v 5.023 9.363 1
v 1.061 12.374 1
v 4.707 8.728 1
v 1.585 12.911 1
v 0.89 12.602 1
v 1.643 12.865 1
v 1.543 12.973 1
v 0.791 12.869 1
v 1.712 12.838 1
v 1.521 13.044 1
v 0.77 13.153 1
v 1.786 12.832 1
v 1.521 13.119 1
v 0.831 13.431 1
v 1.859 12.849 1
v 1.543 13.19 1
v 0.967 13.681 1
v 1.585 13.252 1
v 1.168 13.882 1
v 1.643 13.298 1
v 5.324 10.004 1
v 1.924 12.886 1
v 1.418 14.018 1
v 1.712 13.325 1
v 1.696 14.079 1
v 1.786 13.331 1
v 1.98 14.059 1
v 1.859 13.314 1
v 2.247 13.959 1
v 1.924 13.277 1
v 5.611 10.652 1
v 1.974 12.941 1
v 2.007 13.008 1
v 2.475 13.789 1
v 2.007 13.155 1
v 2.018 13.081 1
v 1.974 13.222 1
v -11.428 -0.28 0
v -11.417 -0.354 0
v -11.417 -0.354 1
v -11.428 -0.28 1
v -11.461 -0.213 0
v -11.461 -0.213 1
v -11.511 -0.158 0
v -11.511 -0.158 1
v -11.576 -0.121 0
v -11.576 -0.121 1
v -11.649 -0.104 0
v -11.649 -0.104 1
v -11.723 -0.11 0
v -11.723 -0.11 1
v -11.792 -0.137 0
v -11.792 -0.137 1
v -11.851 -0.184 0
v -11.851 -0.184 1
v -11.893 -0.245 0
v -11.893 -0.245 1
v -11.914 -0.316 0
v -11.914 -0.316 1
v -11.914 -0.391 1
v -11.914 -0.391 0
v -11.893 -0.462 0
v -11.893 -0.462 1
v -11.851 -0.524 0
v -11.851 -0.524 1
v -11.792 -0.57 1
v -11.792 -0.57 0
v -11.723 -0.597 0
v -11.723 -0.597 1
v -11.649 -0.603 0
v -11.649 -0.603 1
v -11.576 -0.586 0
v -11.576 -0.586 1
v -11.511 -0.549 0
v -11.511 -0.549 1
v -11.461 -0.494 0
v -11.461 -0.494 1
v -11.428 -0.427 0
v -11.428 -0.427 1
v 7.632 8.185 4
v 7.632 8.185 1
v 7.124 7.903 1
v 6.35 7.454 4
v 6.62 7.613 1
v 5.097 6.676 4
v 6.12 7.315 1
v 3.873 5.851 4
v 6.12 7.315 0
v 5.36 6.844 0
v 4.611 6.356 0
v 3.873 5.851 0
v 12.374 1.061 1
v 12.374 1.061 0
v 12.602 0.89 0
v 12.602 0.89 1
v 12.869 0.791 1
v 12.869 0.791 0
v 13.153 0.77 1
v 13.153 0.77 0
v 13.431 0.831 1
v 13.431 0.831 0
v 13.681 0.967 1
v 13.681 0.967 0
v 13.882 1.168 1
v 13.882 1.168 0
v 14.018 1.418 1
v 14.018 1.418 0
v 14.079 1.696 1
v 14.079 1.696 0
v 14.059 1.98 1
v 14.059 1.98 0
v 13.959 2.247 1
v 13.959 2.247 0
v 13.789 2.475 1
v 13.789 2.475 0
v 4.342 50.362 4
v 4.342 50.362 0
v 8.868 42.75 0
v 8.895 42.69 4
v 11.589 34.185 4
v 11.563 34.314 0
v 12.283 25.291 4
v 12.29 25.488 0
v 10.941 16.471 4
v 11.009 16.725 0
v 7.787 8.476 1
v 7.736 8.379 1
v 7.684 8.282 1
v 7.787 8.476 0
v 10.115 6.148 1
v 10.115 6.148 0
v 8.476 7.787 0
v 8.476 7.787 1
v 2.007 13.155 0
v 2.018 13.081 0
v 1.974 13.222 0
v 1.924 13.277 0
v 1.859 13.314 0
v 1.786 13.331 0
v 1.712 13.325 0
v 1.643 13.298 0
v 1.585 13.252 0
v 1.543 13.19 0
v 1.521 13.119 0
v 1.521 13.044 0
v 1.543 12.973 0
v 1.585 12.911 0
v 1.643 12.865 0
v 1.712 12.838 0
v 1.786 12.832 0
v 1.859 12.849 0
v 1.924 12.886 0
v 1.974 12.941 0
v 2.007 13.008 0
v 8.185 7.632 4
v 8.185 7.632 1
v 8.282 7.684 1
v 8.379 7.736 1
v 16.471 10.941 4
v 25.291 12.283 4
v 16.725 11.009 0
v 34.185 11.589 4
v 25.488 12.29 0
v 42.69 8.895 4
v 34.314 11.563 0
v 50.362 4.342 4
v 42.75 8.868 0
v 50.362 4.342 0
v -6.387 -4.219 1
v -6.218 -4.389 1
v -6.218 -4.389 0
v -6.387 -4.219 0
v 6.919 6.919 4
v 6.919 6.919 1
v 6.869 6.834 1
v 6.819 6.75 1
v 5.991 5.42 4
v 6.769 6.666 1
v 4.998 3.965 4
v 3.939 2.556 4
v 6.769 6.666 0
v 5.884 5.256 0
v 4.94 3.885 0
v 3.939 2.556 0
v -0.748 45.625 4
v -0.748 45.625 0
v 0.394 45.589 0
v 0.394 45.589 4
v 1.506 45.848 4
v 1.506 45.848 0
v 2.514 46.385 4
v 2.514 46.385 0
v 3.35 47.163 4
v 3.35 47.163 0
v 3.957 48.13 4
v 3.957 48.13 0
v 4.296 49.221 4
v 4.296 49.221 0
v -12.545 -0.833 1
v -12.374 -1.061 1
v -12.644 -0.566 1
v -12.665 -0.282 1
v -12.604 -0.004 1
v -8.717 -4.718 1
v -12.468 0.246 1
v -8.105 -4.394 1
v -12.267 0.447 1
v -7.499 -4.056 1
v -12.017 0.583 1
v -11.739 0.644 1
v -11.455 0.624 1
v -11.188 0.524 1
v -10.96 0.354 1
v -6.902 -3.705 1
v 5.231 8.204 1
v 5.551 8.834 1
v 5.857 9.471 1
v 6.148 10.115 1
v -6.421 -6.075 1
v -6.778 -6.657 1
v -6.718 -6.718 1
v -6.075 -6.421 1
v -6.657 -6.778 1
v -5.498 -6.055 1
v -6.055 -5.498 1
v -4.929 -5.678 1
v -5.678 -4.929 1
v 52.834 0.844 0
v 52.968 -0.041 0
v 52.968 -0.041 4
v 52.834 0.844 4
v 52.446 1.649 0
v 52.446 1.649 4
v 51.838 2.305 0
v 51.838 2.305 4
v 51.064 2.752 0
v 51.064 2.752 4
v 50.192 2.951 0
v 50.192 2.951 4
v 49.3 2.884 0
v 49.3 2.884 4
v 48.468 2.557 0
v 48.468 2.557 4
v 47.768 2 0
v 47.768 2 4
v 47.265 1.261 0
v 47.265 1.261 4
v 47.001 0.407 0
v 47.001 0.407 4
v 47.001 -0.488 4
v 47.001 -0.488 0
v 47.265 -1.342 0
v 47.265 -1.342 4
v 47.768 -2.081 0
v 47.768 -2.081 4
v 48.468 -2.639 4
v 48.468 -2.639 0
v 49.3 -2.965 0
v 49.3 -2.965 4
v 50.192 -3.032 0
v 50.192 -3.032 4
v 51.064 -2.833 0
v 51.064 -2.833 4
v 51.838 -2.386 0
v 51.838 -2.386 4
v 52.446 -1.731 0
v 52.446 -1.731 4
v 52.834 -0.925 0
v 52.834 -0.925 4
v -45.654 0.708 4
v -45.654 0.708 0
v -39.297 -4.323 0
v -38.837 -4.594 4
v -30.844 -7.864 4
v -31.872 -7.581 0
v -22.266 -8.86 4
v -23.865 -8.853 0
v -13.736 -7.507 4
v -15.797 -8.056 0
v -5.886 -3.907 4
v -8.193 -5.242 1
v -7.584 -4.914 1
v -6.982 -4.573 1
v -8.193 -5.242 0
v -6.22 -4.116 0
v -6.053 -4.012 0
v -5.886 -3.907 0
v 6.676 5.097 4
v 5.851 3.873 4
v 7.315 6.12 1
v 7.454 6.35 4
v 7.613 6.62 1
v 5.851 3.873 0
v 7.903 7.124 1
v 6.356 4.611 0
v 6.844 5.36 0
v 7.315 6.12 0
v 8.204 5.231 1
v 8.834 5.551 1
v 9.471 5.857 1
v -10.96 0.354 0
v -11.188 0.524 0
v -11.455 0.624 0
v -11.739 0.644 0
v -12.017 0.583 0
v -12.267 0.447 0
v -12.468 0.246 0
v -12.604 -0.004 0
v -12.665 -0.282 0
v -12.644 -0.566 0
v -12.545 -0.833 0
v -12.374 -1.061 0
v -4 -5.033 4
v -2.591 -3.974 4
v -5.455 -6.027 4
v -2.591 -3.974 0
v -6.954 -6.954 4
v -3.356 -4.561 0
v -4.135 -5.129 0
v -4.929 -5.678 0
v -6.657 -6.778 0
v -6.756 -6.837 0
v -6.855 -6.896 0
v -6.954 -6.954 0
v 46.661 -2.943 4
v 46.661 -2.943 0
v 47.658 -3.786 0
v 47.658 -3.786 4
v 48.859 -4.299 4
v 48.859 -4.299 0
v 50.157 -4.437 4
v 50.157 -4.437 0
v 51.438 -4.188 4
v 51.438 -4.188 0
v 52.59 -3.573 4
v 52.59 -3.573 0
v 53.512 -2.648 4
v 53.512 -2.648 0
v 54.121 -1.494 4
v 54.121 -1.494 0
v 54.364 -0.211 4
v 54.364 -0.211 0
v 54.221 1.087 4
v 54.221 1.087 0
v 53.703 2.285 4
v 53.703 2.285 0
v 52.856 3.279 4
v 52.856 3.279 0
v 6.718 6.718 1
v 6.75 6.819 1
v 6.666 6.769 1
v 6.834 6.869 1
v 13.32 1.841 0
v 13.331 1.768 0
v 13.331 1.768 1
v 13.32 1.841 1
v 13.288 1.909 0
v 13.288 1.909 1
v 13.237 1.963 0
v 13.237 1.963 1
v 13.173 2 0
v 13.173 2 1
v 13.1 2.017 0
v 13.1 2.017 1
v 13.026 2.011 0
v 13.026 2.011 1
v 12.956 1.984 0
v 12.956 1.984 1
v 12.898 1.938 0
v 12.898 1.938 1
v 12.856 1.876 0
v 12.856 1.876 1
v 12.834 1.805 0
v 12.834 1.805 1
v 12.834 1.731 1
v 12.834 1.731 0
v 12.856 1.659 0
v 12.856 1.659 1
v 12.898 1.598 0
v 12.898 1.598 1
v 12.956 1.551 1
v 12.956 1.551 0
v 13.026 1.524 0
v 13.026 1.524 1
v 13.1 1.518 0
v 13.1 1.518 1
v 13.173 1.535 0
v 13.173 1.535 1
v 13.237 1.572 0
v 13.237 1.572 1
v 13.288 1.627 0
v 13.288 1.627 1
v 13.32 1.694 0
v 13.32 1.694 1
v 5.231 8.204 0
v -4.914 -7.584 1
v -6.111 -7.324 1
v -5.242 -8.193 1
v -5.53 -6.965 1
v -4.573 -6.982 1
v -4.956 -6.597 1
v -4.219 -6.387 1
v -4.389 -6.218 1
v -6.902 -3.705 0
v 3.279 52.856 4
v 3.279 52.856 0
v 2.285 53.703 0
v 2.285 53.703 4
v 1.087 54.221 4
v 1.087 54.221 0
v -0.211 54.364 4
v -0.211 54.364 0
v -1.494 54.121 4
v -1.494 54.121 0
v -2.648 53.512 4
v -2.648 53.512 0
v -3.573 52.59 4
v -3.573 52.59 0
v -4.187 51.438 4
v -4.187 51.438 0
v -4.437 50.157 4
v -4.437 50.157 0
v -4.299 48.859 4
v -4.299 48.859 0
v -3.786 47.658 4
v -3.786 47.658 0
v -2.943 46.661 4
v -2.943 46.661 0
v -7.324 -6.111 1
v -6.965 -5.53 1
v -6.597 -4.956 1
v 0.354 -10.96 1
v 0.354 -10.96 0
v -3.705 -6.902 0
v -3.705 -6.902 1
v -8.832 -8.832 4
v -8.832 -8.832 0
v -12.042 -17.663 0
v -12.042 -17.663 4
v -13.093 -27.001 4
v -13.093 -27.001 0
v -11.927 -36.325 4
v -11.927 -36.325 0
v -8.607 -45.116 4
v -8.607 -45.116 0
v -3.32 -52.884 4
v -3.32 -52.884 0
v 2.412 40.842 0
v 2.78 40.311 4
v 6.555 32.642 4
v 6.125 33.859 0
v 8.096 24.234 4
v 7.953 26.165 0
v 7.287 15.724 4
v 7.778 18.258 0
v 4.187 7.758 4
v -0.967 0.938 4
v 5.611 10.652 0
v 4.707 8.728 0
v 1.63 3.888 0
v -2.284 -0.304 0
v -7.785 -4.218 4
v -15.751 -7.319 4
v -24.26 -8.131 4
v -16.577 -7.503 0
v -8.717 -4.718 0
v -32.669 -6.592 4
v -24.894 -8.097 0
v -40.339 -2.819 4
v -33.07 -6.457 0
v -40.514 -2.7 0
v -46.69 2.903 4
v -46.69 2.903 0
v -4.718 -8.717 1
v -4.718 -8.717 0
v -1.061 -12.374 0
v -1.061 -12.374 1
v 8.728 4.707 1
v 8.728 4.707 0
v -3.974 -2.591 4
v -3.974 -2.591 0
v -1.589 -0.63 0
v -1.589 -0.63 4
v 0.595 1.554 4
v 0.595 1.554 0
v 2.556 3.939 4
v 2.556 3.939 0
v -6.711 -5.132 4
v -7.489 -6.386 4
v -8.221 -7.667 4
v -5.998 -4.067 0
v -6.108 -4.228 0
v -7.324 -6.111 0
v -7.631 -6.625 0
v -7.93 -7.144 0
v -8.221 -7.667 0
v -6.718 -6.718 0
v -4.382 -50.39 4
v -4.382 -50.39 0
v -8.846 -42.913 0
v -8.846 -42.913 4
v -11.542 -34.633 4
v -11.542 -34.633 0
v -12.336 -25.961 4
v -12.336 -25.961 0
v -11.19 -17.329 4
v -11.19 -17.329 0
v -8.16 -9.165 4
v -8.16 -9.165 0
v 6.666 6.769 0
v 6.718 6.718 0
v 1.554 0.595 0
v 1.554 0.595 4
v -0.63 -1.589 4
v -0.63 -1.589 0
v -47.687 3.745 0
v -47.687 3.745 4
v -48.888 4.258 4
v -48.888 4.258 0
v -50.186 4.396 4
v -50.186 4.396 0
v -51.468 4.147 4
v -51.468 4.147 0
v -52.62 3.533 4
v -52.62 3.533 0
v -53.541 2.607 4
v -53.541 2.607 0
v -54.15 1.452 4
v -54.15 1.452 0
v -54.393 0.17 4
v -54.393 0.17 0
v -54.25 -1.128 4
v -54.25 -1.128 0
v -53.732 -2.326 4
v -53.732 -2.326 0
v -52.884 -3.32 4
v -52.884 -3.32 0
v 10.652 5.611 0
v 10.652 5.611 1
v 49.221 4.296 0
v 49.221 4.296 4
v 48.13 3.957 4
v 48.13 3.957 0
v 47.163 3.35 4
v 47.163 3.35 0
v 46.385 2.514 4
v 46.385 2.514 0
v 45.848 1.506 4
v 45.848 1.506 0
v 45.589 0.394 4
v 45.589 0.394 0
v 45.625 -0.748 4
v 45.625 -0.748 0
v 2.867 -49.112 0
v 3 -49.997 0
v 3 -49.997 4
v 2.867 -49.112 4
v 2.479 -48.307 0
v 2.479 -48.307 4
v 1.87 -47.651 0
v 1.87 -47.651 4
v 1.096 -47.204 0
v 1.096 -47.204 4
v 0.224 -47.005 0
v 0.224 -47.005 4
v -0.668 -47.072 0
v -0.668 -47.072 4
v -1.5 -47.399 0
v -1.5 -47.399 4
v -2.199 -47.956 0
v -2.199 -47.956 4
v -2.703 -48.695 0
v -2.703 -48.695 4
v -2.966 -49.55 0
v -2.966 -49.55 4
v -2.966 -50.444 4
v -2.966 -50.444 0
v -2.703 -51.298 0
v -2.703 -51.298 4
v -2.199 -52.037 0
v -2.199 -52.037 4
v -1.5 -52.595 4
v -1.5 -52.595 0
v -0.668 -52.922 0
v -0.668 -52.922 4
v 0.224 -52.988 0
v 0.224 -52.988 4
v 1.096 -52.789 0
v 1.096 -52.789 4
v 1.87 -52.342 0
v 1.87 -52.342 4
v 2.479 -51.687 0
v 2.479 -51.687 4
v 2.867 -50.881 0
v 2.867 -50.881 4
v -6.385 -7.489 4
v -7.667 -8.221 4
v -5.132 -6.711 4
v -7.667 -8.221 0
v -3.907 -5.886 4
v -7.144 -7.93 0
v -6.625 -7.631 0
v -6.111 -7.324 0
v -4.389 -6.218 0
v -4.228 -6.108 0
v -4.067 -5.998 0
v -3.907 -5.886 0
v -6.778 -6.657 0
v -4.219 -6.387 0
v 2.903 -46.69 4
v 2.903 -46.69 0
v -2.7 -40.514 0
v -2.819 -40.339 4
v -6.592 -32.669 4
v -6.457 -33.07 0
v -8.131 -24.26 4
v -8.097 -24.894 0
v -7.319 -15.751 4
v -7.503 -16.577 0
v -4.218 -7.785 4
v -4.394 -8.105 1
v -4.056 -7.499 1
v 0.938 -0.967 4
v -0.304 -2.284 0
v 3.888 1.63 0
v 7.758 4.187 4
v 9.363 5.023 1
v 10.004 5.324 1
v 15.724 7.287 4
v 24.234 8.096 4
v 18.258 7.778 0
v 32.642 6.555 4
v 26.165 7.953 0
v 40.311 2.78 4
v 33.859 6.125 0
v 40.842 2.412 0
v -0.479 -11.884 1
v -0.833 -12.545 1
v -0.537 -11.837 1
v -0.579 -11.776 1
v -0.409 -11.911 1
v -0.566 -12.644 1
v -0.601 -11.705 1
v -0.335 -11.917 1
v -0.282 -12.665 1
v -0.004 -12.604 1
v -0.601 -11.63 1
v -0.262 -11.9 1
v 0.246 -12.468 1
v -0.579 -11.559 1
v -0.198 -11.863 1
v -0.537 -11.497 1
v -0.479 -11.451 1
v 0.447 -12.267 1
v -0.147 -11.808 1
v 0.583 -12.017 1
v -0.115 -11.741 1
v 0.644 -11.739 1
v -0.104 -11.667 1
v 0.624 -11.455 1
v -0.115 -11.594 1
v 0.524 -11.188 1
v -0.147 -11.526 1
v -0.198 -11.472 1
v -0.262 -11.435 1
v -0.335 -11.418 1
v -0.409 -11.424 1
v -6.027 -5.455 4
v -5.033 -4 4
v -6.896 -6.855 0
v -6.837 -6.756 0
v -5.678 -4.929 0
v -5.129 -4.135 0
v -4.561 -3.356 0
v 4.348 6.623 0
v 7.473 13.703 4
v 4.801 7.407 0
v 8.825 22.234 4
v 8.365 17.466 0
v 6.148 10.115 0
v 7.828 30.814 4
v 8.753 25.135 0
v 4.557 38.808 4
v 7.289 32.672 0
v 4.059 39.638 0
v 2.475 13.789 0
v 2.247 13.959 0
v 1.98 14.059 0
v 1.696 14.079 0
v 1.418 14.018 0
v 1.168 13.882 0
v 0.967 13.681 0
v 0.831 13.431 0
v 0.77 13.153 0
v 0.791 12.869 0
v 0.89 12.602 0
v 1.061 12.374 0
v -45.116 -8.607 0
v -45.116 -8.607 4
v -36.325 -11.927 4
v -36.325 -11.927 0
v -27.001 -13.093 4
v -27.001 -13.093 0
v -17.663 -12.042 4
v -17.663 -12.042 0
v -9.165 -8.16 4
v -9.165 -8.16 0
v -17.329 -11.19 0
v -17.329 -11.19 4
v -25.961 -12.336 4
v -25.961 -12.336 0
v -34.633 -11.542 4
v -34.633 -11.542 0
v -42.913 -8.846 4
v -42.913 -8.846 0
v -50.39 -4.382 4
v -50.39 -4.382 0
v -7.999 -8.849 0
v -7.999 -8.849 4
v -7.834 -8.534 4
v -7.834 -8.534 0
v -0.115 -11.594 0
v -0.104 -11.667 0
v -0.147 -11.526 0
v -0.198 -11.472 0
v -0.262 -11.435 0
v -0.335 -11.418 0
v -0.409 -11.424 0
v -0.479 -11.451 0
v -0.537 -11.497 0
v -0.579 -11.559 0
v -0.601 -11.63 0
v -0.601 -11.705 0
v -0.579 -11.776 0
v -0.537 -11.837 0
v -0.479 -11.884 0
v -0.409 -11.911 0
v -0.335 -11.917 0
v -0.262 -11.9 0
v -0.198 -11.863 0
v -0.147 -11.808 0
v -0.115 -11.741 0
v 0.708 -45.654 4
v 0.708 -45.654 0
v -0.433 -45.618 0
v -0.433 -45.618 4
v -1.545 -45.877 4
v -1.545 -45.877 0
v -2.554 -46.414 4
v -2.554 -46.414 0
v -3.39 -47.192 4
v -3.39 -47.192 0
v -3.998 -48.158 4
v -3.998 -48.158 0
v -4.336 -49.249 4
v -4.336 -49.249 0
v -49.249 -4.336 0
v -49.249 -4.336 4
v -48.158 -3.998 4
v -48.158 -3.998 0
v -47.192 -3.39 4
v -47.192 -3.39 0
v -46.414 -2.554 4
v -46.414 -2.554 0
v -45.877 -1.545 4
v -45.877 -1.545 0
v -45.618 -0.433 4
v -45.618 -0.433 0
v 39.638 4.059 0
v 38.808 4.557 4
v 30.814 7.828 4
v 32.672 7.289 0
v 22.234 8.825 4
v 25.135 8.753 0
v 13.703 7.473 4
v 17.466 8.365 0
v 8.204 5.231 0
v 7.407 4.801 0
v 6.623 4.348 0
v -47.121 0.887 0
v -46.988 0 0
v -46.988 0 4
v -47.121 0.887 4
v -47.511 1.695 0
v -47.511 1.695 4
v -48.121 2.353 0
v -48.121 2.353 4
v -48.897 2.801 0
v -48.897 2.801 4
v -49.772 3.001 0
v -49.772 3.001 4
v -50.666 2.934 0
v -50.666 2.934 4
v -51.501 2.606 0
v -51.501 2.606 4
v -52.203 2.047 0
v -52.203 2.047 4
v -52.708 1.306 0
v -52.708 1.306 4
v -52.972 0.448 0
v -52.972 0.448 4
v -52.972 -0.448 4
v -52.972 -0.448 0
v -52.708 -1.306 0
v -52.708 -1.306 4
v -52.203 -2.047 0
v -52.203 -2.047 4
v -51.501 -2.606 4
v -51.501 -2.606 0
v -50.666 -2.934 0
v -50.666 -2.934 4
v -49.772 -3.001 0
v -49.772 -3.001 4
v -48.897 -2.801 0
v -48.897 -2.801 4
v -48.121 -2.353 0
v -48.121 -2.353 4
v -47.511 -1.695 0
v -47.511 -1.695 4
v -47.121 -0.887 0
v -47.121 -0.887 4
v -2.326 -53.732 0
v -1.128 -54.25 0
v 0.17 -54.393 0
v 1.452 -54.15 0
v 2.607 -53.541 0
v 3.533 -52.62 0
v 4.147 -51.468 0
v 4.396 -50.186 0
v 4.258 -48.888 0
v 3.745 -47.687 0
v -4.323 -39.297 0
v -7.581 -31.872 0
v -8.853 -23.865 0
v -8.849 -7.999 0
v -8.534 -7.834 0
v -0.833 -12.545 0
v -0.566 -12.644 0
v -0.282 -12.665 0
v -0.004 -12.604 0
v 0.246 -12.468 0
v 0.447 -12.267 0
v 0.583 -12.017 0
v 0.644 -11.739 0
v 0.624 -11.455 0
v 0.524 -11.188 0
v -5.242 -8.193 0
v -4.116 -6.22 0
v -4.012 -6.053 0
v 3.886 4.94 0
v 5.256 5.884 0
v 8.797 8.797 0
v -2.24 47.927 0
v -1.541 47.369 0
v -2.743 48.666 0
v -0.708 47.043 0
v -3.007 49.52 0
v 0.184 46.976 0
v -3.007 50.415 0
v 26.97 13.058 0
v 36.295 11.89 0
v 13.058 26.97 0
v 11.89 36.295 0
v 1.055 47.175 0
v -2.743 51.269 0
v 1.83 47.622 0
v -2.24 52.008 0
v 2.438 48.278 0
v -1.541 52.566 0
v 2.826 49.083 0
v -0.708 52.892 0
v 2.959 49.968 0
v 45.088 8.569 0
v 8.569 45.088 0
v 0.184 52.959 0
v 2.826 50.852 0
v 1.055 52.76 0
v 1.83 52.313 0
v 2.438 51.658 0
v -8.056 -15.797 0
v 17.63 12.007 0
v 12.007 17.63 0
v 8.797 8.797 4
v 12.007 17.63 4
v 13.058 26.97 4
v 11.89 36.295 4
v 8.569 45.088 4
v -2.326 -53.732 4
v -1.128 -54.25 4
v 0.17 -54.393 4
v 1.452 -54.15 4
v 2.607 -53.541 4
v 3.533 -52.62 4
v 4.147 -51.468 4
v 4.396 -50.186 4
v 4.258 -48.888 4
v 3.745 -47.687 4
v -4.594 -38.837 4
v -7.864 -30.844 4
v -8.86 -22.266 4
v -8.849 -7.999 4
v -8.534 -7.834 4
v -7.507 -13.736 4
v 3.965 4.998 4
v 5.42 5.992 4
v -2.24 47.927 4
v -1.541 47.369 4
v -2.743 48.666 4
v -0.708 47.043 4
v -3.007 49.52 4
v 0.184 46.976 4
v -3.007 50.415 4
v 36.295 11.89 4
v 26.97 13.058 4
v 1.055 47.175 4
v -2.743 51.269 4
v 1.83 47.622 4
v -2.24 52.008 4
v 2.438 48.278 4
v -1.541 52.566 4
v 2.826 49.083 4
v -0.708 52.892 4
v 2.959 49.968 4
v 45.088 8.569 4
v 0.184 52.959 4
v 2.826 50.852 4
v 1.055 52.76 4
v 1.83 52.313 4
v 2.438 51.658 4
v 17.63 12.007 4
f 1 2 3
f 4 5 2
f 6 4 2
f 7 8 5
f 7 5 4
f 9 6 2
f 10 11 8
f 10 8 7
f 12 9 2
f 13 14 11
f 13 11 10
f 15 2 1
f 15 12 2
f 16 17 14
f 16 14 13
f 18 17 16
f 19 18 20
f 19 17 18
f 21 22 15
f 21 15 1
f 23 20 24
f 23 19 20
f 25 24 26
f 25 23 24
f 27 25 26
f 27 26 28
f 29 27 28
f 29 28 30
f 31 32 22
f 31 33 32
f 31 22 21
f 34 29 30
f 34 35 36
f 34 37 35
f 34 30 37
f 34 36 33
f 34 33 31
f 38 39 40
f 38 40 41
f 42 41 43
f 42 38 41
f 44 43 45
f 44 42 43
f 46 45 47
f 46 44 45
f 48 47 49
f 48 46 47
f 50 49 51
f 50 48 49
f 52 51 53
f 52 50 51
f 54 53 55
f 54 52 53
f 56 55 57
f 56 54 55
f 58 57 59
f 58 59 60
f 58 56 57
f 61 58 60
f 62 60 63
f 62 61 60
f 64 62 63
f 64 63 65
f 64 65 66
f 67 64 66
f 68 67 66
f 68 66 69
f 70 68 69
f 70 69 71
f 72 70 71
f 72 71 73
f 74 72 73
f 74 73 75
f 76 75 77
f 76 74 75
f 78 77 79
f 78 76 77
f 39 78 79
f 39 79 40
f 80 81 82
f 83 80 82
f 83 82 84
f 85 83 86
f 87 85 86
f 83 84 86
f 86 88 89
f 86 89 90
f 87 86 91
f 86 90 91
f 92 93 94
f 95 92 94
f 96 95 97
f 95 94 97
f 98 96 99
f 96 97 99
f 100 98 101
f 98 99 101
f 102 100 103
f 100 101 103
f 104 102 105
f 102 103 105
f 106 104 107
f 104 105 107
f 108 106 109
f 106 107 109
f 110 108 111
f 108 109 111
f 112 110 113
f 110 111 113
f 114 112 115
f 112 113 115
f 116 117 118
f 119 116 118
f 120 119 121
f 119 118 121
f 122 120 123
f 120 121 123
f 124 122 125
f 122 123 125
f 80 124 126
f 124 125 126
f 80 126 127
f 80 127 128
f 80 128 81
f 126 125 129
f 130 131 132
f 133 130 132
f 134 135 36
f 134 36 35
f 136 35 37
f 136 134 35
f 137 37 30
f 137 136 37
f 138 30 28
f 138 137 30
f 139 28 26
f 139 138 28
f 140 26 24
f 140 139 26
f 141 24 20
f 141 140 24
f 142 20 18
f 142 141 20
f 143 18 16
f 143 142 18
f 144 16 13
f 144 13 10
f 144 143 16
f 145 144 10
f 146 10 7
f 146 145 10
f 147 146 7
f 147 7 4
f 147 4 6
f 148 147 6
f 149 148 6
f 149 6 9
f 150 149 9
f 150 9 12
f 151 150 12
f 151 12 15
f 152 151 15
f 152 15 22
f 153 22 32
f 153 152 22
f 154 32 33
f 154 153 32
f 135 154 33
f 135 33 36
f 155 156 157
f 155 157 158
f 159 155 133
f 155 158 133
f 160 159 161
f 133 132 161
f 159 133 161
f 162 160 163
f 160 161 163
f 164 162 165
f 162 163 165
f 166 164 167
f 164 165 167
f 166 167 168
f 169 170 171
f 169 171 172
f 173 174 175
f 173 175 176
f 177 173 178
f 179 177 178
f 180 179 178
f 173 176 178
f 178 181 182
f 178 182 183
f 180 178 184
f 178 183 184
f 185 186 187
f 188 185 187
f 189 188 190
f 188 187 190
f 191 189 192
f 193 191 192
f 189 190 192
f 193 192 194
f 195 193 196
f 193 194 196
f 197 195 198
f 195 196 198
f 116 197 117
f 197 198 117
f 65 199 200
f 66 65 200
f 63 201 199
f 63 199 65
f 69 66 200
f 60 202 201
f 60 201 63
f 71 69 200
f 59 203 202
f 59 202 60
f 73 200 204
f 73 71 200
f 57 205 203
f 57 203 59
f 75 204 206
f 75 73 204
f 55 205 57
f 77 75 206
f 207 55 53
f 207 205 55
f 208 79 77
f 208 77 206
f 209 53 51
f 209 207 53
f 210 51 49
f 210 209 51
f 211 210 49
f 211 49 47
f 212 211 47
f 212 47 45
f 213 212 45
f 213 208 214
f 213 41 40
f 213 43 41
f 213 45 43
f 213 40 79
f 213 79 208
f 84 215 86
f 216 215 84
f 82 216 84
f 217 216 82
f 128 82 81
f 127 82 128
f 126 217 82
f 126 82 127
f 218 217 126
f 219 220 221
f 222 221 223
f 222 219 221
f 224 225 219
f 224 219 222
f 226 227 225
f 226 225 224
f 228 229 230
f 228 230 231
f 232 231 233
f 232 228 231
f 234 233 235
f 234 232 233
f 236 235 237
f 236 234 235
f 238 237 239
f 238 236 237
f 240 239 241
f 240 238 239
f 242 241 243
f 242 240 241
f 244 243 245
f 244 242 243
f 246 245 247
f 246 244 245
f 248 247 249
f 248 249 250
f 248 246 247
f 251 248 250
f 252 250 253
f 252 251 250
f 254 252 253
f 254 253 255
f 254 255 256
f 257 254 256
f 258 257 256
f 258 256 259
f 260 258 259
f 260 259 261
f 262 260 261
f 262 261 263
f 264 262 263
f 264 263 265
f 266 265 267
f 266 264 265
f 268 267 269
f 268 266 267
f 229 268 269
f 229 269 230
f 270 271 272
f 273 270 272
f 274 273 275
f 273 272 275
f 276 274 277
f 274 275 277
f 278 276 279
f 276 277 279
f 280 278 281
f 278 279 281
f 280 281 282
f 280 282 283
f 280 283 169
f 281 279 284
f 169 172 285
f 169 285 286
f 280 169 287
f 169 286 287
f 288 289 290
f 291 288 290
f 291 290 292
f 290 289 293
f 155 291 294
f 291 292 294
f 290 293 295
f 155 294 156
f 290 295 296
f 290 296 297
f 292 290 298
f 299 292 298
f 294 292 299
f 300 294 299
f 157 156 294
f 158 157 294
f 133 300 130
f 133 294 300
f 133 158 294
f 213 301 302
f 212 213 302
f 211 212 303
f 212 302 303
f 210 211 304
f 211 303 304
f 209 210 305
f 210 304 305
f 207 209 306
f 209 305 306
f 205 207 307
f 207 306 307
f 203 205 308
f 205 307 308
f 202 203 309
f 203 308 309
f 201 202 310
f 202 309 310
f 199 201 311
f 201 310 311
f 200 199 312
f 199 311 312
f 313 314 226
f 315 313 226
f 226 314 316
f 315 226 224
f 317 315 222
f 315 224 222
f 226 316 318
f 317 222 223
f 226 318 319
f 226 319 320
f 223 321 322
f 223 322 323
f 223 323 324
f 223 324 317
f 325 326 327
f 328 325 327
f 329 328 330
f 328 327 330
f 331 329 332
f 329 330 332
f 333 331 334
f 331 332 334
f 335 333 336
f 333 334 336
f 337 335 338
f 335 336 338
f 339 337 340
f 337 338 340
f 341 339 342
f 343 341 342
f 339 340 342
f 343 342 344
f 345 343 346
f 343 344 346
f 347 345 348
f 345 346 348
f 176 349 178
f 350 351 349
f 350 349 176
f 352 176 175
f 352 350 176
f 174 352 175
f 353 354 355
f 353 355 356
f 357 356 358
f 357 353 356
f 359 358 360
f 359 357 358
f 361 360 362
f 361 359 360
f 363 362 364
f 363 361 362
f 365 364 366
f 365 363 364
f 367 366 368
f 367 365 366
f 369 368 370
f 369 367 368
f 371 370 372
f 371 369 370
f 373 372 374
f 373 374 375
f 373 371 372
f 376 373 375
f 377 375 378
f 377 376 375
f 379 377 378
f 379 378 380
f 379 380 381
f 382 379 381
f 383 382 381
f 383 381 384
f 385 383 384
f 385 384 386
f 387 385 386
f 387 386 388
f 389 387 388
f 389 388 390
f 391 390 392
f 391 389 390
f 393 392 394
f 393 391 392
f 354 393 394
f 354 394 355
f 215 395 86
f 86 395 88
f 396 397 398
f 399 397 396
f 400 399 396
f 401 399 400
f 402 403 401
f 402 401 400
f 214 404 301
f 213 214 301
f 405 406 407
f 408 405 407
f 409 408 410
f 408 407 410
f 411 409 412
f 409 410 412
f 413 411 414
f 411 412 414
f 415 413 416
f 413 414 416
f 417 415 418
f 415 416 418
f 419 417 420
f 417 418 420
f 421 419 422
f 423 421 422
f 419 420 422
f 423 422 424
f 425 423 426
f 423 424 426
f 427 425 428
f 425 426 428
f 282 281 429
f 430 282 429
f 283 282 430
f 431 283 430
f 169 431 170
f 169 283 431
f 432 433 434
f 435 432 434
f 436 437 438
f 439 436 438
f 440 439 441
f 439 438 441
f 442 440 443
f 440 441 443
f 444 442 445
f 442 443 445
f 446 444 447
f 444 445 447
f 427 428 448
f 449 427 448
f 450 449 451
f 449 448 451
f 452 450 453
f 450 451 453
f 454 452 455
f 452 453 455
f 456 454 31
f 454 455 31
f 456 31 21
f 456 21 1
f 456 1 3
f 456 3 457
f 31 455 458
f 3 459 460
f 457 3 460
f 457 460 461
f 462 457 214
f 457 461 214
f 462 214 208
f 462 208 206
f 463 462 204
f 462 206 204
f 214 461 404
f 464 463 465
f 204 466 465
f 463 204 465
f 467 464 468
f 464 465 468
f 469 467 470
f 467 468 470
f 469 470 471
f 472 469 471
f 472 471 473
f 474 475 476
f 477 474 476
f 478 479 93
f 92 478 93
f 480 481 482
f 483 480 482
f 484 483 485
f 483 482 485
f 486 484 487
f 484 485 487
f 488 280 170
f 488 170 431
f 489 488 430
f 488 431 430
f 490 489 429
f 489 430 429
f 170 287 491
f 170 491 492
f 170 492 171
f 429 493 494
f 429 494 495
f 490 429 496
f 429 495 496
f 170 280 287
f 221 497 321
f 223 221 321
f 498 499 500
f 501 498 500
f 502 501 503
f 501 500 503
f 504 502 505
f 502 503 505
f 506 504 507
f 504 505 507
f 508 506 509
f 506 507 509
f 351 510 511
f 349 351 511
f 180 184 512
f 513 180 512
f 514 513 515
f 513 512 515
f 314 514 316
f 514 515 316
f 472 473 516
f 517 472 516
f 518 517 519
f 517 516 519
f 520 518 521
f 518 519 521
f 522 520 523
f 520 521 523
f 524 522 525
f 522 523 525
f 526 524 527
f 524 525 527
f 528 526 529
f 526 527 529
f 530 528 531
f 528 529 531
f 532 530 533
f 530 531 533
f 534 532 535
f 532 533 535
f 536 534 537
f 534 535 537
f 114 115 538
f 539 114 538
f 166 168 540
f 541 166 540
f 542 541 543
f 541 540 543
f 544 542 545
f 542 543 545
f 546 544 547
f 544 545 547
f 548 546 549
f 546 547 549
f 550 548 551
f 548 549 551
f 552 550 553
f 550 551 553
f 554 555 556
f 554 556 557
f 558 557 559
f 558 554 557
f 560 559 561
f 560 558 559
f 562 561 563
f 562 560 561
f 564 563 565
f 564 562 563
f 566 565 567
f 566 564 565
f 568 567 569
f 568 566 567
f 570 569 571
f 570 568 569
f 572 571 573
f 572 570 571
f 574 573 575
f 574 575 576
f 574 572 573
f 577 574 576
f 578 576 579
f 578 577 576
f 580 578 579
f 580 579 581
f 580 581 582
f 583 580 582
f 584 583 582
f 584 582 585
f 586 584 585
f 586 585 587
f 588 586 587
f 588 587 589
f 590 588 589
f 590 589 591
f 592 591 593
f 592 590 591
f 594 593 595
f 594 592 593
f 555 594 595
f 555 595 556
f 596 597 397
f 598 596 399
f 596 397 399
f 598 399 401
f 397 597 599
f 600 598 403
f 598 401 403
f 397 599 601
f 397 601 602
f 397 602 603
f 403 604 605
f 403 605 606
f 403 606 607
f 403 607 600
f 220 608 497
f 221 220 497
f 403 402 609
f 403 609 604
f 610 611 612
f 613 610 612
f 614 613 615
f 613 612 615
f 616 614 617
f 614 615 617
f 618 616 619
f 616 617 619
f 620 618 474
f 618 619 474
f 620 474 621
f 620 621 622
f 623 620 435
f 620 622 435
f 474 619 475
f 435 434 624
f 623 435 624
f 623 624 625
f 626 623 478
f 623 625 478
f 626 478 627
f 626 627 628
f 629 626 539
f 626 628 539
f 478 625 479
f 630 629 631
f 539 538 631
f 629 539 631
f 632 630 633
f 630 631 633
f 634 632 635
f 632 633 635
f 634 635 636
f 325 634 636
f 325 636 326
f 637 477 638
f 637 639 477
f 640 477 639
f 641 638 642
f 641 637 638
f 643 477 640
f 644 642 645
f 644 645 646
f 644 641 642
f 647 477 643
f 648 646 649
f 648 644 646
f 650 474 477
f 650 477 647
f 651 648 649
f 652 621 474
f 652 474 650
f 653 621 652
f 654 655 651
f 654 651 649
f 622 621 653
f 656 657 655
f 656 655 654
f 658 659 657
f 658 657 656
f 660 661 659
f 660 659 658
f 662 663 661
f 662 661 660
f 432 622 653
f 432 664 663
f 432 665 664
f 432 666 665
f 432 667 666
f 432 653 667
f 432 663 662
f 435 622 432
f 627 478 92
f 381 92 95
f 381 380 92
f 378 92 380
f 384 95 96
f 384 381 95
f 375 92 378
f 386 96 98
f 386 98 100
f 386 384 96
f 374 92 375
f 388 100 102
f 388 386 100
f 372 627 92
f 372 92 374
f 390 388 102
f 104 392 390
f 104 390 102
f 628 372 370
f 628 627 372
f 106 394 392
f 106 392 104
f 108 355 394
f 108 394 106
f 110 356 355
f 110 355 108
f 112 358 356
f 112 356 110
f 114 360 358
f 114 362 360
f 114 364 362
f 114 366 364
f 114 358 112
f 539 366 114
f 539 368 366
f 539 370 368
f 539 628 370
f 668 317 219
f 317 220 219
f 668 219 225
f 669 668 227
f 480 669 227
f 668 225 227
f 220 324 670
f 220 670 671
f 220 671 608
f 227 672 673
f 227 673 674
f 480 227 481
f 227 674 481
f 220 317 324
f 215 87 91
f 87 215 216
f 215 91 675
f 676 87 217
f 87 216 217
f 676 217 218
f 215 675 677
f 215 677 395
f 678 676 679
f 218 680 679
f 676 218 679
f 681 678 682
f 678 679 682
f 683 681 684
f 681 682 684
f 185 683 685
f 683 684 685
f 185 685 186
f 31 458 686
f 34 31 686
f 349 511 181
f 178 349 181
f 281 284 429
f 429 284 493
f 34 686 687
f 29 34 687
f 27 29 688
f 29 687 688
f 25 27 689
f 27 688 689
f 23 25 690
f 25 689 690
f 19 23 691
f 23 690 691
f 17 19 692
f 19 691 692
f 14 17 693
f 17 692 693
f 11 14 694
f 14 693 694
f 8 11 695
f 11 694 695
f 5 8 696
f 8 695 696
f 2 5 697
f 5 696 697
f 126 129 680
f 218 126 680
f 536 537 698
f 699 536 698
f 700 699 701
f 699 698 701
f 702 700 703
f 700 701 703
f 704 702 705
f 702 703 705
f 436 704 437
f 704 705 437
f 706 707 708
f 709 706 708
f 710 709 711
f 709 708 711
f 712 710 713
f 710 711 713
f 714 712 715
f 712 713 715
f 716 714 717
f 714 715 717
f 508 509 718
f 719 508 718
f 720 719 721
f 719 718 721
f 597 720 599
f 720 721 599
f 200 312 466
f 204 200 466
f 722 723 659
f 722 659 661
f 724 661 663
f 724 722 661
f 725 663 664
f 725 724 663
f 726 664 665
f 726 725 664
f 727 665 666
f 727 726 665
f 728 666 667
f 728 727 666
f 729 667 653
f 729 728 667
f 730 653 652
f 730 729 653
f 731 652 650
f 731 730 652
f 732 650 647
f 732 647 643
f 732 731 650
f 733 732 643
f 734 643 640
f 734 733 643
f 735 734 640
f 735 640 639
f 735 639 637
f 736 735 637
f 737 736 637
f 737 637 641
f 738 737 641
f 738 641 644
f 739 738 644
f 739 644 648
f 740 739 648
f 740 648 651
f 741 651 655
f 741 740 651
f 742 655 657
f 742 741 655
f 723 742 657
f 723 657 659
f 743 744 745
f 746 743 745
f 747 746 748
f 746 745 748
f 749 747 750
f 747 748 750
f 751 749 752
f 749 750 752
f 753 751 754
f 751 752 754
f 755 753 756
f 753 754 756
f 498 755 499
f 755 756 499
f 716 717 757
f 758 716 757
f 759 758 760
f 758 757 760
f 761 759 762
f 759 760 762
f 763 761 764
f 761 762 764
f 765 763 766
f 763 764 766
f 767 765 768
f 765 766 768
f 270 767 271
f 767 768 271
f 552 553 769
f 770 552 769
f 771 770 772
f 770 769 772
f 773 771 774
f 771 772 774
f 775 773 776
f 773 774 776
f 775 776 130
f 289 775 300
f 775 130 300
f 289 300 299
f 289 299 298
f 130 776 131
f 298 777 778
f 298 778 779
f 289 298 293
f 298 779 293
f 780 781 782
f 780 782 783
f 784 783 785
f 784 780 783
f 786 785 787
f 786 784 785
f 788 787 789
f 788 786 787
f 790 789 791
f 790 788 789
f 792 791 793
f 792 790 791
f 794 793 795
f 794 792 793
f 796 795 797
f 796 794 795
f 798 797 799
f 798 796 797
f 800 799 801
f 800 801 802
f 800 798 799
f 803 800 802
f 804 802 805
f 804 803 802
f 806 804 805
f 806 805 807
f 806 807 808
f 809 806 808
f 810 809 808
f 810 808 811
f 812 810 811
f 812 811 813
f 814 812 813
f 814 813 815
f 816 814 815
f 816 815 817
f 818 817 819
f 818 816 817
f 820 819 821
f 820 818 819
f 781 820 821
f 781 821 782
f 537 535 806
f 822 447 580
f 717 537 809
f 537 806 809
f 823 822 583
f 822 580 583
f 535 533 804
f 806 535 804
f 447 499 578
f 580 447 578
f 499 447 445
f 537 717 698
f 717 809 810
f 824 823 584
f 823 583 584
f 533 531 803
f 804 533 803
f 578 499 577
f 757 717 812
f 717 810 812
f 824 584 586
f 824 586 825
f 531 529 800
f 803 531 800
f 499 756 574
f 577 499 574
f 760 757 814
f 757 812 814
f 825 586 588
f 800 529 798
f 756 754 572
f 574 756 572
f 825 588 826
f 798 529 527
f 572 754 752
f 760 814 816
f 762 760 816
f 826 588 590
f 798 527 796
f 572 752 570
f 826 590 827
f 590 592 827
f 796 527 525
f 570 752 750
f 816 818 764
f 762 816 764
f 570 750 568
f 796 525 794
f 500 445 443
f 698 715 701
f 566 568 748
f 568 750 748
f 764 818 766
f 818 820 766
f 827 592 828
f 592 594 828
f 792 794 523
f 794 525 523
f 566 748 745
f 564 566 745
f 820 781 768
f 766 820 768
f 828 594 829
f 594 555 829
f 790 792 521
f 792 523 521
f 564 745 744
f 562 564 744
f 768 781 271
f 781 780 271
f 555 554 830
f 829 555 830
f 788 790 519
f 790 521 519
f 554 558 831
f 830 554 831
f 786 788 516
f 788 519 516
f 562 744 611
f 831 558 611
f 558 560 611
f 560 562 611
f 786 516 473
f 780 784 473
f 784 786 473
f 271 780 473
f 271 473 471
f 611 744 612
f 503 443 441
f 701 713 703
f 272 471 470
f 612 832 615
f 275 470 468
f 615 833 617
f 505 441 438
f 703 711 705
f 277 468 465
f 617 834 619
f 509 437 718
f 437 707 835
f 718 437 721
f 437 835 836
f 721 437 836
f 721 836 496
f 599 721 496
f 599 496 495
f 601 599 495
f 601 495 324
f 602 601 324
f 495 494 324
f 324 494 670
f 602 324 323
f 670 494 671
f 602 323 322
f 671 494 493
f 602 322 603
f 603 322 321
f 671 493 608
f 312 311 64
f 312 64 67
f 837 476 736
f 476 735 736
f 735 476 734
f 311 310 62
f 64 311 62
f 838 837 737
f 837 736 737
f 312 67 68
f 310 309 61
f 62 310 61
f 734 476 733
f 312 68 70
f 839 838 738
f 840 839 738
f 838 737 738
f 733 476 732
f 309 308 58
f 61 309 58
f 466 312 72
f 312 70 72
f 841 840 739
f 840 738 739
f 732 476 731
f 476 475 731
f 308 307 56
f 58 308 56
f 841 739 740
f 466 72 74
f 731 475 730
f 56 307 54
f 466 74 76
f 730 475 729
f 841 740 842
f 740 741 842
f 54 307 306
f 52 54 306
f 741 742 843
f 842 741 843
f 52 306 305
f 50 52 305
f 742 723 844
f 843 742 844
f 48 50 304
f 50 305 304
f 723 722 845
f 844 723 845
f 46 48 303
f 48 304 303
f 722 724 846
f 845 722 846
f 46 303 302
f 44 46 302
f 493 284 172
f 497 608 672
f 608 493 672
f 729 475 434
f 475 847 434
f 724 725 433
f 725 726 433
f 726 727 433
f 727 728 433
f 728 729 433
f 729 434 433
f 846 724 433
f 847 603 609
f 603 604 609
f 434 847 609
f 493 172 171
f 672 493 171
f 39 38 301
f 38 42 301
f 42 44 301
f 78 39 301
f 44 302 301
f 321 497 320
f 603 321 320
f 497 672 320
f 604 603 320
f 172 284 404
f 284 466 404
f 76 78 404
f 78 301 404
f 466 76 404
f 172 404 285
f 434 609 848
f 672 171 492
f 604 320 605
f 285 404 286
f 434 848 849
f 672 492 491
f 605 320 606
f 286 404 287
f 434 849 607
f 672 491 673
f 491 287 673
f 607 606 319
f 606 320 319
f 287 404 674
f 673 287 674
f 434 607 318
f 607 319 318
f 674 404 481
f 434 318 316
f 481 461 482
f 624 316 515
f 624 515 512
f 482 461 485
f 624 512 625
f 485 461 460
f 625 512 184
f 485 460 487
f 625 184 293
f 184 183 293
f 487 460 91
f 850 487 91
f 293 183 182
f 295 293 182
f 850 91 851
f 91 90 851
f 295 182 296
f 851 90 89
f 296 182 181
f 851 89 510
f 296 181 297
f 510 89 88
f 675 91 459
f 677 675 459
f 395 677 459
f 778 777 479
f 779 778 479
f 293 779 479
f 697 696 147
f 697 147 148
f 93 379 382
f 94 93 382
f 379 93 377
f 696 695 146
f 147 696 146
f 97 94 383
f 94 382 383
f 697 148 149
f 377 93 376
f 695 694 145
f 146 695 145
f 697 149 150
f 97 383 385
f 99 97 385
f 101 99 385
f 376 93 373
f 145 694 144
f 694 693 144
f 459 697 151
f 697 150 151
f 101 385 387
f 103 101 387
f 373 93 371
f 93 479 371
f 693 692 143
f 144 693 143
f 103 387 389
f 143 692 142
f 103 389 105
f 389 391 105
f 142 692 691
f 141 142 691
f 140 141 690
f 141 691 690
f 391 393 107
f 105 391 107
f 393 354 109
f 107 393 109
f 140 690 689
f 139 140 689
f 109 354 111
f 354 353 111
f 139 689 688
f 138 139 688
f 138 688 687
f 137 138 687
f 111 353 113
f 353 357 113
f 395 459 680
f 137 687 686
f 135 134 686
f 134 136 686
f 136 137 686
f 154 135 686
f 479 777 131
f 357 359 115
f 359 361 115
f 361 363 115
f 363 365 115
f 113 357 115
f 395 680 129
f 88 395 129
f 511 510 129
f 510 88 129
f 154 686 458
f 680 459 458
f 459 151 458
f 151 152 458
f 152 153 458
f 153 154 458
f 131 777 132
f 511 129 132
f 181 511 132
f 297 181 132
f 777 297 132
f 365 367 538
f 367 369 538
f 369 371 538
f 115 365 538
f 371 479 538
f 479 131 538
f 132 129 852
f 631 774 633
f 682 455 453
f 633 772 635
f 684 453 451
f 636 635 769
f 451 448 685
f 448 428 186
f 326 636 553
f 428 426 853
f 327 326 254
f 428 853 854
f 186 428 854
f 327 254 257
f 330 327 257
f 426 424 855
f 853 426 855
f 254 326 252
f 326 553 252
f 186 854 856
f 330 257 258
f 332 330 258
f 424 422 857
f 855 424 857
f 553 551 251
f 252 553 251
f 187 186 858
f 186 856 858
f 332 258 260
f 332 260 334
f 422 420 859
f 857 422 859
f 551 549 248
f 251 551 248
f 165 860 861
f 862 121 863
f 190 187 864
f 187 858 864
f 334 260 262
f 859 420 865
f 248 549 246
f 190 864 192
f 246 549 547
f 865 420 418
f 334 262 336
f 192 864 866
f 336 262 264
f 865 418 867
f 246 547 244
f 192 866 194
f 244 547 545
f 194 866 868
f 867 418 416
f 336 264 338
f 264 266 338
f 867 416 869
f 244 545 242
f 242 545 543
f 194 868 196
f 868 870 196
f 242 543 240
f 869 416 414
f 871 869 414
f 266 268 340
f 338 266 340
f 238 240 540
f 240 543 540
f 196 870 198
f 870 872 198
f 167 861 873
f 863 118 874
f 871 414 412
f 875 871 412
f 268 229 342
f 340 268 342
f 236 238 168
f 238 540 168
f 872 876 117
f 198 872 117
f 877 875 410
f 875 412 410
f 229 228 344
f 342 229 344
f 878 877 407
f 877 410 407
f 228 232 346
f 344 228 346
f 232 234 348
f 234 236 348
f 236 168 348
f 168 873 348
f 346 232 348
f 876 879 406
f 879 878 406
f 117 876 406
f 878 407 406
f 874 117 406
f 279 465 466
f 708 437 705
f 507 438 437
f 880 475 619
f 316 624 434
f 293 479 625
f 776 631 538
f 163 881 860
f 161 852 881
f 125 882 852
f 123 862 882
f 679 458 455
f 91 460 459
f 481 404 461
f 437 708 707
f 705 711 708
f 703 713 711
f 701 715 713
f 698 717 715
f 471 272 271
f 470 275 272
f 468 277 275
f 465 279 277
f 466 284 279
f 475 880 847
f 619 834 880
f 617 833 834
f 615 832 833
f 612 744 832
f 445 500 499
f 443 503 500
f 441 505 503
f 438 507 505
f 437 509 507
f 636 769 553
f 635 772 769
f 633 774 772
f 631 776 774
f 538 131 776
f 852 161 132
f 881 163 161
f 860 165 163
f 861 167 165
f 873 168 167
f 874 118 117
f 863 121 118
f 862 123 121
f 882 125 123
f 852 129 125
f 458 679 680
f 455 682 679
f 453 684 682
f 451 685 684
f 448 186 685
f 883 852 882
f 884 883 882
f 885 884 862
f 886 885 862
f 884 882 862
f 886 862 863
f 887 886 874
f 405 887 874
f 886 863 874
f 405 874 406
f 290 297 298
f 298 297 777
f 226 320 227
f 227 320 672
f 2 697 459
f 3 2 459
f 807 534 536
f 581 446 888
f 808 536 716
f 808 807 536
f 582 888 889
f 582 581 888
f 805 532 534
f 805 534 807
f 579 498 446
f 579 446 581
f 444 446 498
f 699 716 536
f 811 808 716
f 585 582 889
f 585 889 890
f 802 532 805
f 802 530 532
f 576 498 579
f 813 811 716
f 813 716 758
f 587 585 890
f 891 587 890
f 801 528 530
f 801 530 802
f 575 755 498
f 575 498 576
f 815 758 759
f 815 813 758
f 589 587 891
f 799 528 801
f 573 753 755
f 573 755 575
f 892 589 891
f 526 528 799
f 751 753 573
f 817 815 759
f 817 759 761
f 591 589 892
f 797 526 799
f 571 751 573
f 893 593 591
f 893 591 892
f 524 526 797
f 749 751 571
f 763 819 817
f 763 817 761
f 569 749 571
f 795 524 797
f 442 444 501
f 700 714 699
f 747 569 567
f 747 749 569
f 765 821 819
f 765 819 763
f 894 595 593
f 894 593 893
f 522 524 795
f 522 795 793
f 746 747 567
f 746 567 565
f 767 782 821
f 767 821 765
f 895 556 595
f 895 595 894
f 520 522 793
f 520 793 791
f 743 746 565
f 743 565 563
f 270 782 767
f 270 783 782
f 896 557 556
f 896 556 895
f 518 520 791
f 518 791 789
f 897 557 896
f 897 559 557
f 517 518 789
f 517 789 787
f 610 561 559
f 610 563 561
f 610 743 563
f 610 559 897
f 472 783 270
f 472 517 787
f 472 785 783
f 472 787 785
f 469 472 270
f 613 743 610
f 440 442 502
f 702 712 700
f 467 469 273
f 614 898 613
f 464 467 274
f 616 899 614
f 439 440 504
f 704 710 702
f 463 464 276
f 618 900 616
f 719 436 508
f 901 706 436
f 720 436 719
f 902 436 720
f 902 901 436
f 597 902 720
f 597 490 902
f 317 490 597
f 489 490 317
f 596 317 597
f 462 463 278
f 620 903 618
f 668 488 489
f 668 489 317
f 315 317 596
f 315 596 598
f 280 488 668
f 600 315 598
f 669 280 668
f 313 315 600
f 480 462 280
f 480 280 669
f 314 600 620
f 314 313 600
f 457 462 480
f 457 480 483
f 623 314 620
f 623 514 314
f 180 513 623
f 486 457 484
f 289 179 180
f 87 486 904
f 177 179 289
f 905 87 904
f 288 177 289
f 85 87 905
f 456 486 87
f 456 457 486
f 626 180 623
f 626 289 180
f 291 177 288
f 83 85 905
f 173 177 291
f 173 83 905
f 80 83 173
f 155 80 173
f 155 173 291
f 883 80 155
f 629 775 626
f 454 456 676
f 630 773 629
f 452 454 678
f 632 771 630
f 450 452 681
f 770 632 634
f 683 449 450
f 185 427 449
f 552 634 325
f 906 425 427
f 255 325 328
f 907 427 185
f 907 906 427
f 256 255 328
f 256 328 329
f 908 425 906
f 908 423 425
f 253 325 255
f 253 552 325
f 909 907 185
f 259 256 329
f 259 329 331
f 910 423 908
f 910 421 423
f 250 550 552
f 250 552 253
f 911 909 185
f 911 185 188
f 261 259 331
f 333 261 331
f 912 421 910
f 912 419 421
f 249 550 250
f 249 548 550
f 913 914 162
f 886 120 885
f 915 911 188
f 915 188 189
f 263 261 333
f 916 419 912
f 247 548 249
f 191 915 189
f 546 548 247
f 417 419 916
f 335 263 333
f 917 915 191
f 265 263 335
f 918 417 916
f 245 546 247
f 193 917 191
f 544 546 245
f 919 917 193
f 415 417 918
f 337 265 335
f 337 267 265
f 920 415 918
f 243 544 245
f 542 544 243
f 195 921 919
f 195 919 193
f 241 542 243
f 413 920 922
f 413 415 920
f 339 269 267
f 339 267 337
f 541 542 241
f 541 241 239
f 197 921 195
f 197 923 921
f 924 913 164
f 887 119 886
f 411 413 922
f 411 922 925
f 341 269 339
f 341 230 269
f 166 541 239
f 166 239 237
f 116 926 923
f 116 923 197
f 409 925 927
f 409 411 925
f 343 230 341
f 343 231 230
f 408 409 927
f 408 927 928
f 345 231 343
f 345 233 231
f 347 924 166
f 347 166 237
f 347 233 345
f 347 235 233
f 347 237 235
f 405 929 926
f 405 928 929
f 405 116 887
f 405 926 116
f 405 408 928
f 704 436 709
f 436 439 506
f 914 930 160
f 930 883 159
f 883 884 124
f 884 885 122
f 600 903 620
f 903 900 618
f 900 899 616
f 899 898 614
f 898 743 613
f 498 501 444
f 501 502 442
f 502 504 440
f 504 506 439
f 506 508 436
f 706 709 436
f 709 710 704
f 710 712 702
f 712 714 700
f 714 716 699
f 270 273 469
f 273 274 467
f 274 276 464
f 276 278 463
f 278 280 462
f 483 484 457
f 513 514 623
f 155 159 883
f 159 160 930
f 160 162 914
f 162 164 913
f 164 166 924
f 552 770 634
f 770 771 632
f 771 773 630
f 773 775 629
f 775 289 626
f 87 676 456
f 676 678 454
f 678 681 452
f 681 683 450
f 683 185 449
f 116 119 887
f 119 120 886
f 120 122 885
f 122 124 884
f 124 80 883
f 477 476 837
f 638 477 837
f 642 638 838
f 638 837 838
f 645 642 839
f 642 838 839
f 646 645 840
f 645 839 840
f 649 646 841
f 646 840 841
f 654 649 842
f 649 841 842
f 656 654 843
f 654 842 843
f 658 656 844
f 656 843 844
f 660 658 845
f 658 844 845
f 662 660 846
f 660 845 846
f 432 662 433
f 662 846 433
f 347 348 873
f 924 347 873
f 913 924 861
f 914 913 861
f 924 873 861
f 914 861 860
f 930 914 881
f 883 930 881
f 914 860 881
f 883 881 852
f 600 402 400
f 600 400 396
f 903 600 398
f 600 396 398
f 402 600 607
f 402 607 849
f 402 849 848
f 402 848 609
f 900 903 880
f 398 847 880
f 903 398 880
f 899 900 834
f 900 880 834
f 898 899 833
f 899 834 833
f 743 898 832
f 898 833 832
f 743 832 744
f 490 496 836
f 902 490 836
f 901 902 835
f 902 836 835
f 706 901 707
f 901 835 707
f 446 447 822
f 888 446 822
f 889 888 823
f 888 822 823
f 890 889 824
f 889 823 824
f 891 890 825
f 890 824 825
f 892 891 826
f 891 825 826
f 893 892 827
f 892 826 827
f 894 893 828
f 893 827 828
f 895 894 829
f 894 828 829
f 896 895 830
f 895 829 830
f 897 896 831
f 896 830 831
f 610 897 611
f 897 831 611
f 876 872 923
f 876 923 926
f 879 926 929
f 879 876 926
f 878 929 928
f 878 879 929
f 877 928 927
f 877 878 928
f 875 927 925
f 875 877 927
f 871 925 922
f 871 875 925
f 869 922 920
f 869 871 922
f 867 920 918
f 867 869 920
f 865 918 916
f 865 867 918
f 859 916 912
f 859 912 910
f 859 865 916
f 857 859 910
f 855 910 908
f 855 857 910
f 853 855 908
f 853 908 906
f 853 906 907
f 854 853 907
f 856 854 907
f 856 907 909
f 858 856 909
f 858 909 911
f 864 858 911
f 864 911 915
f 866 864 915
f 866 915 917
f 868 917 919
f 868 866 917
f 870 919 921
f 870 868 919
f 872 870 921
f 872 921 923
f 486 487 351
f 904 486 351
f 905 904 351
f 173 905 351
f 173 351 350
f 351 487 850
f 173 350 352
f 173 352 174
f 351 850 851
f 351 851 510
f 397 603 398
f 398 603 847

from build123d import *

# Parameters (mm, degrees)
F0_R     = 3
F0_R_2   = 3.009085
F2_DEPTH = 4
F1_R     = 0.25
F3_DEPTH = 1


with BuildPart() as f2:
    # F0 (on Top) → F2 (new body)
    with BuildSketch(Plane.XY):
        with BuildLine():
            ThreePointArc((-2.943287, 46.660864), (-0.966878, 0.938237), (-46.69002, 2.902697))
            ThreePointArc((-46.69002, 2.902697), (-53.115015, 3.104241), (-52.884477, -3.319779))
            ThreePointArc((-52.884477, -3.319779), (-31.69787, -12.786126), (-8.831983, -8.831983))
            ThreePointArc((-8.831983, -8.831983), (-12.786126, -31.69787), (-3.319779, -52.884477))
            ThreePointArc((-3.319779, -52.884477), (3.104241, -53.115015), (2.902697, -46.69002))
            ThreePointArc((2.902697, -46.69002), (0.938286, -0.966912), (46.660878, -2.943288))
            ThreePointArc((46.660878, -2.943288), (53.085559, -3.145237), (52.85609, 3.27852))
            ThreePointArc((52.85609, 3.27852), (31.667127, 12.75029), (8.796713, 8.796713))
            ThreePointArc((8.796713, 8.796713), (12.75029, 31.667127), (3.27852, 52.85609))
            ThreePointArc((3.27852, 52.85609), (-3.145192, 53.085499), (-2.943287, 46.660864))
        make_face()
        with BuildLine():
            ThreePointArc((-3.907323, -5.886159), (-8.65465, -26.588997), (0.708341, -45.654123))
            ThreePointArc((0.708341, -45.654123), (-2.997064, -46.775303), (-4.382365, -50.390274))
            ThreePointArc((-4.382365, -50.390274), (-12.181233, -30.319052), (-8.159824, -9.164748))
            ThreePointArc((-8.159824, -9.164748), (-7.916828, -8.690968), (-7.667397, -8.220543))
            ThreePointArc((-7.667397, -8.220543), (-5.754898, -7.105639), (-3.907323, -5.886159))
        make_face(mode=Mode.SUBTRACT)
        with BuildLine():
            ThreePointArc((-50.390274, -4.382365), (-46.775303, -2.997064), (-45.654123, 0.708341))
            ThreePointArc((-45.654123, 0.708341), (-26.589057, -8.654679), (-5.88624, -3.907439))
            ThreePointArc((-5.88624, -3.907439), (-7.105676, -5.754958), (-8.220543, -7.667397))
            ThreePointArc((-8.220543, -7.667397), (-8.690968, -7.916828), (-9.164748, -8.159824))
            ThreePointArc((-9.164748, -8.159824), (-30.319052, -12.181233), (-50.390274, -4.382365))
        make_face(mode=Mode.SUBTRACT)
        with BuildLine():
            ThreePointArc((-6.954048, -6.954048), (-5.537825, -4.72203), (-3.973892, -2.590902))
            ThreePointArc((-3.973892, -2.590902), (-0.470244, 0.435462), (2.556183, 3.939056))
            ThreePointArc((2.556183, 3.939056), (4.687049, 5.502753), (6.918778, 6.918778))
            ThreePointArc((6.918778, 6.918778), (5.502695, 4.686965), (3.93893, 2.556023))
            ThreePointArc((3.93893, 2.556023), (0.435502, -0.47028), (-2.590738, -3.973763))
            ThreePointArc((-2.590738, -3.973763), (-4.721944, -5.537766), (-6.954048, -6.954048))
        make_face(mode=Mode.SUBTRACT)
        with Locations((0, -49.996732)):
            Circle(F0_R, mode=Mode.SUBTRACT)
        with Locations((49.967591, -0.040591)):
            Circle(F0_R, mode=Mode.SUBTRACT)
        with Locations((-49.996732, 0)):
            Circle(F0_R_2, mode=Mode.SUBTRACT)
        with Locations((-0.040589, 49.967576)):
            Circle(F0_R, mode=Mode.SUBTRACT)
        with BuildLine():
            ThreePointArc((50.362121, 4.341686), (46.746855, 2.957219), (45.624813, -0.7479))
            ThreePointArc((45.624813, -0.7479), (26.55794, 8.619893), (5.851302, 3.872643))
            ThreePointArc((5.851302, 3.872643), (7.070559, 5.719934), (8.185273, 7.632127))
            ThreePointArc((8.185273, 7.632127), (29.757679, 12.190586), (50.362121, 4.341686))
        make_face(mode=Mode.SUBTRACT)
        with BuildLine():
            ThreePointArc((3.872754, 5.85138), (8.619916, 26.557989), (-0.7479, 45.624799))
            ThreePointArc((-0.7479, 45.624799), (2.957225, 46.746845), (4.341686, 50.362121))
            ThreePointArc((4.341686, 50.362121), (12.190586, 29.757679), (7.632127, 8.185273))
            ThreePointArc((7.632127, 8.185273), (5.719991, 7.070594), (3.872754, 5.85138))
        make_face(mode=Mode.SUBTRACT)
    extrude(amount=F2_DEPTH)

    # F1 (on Top) → F3 (join)
    with BuildSketch(Plane.XY):
        with BuildLine():
            ThreePointArc((-10.960155, 0.353553), (-12.374369, 0.353553), (-12.374369, -1.06066))
            Line((-12.374369, -1.06066), (-6.717514, -6.717514))
            Line((-6.717514, -6.717514), (-1.06066, -12.374369))
            ThreePointArc((-1.06066, -12.374369), (0.353553, -12.374369), (0.353553, -10.960155))
            Line((0.353553, -10.960155), (-5.303301, -5.303301))
            Line((-5.303301, -5.303301), (-10.960155, 0.353553))
        make_face()
        with Locations((-0.353553, -11.667262)):
            Circle(F1_R, mode=Mode.SUBTRACT)
        with Locations((-11.667262, -0.353553)):
            Circle(F1_R, mode=Mode.SUBTRACT)
        with BuildLine():
            ThreePointArc((12.374369, 1.06066), (13.788582, 1.06066), (13.788582, 2.474874))
            Line((13.788582, 2.474874), (8.131728, 8.131728))
            Line((8.131728, 8.131728), (6.717514, 6.717514))
            Line((6.717514, 6.717514), (12.374369, 1.06066))
        make_face()
        with Locations((13.081475, 1.767767)):
            Circle(F1_R, mode=Mode.SUBTRACT)
        with BuildLine():
            Line((6.717514, 6.717514), (8.131728, 8.131728))
            Line((8.131728, 8.131728), (2.474874, 13.788582))
            ThreePointArc((2.474874, 13.788582), (1.06066, 13.788582), (1.06066, 12.374369))
            Line((1.06066, 12.374369), (6.717514, 6.717514))
        make_face()
        with Locations((1.767767, 13.081475)):
            Circle(F1_R, mode=Mode.SUBTRACT)
    extrude(amount=F3_DEPTH)


solid = f2.part
